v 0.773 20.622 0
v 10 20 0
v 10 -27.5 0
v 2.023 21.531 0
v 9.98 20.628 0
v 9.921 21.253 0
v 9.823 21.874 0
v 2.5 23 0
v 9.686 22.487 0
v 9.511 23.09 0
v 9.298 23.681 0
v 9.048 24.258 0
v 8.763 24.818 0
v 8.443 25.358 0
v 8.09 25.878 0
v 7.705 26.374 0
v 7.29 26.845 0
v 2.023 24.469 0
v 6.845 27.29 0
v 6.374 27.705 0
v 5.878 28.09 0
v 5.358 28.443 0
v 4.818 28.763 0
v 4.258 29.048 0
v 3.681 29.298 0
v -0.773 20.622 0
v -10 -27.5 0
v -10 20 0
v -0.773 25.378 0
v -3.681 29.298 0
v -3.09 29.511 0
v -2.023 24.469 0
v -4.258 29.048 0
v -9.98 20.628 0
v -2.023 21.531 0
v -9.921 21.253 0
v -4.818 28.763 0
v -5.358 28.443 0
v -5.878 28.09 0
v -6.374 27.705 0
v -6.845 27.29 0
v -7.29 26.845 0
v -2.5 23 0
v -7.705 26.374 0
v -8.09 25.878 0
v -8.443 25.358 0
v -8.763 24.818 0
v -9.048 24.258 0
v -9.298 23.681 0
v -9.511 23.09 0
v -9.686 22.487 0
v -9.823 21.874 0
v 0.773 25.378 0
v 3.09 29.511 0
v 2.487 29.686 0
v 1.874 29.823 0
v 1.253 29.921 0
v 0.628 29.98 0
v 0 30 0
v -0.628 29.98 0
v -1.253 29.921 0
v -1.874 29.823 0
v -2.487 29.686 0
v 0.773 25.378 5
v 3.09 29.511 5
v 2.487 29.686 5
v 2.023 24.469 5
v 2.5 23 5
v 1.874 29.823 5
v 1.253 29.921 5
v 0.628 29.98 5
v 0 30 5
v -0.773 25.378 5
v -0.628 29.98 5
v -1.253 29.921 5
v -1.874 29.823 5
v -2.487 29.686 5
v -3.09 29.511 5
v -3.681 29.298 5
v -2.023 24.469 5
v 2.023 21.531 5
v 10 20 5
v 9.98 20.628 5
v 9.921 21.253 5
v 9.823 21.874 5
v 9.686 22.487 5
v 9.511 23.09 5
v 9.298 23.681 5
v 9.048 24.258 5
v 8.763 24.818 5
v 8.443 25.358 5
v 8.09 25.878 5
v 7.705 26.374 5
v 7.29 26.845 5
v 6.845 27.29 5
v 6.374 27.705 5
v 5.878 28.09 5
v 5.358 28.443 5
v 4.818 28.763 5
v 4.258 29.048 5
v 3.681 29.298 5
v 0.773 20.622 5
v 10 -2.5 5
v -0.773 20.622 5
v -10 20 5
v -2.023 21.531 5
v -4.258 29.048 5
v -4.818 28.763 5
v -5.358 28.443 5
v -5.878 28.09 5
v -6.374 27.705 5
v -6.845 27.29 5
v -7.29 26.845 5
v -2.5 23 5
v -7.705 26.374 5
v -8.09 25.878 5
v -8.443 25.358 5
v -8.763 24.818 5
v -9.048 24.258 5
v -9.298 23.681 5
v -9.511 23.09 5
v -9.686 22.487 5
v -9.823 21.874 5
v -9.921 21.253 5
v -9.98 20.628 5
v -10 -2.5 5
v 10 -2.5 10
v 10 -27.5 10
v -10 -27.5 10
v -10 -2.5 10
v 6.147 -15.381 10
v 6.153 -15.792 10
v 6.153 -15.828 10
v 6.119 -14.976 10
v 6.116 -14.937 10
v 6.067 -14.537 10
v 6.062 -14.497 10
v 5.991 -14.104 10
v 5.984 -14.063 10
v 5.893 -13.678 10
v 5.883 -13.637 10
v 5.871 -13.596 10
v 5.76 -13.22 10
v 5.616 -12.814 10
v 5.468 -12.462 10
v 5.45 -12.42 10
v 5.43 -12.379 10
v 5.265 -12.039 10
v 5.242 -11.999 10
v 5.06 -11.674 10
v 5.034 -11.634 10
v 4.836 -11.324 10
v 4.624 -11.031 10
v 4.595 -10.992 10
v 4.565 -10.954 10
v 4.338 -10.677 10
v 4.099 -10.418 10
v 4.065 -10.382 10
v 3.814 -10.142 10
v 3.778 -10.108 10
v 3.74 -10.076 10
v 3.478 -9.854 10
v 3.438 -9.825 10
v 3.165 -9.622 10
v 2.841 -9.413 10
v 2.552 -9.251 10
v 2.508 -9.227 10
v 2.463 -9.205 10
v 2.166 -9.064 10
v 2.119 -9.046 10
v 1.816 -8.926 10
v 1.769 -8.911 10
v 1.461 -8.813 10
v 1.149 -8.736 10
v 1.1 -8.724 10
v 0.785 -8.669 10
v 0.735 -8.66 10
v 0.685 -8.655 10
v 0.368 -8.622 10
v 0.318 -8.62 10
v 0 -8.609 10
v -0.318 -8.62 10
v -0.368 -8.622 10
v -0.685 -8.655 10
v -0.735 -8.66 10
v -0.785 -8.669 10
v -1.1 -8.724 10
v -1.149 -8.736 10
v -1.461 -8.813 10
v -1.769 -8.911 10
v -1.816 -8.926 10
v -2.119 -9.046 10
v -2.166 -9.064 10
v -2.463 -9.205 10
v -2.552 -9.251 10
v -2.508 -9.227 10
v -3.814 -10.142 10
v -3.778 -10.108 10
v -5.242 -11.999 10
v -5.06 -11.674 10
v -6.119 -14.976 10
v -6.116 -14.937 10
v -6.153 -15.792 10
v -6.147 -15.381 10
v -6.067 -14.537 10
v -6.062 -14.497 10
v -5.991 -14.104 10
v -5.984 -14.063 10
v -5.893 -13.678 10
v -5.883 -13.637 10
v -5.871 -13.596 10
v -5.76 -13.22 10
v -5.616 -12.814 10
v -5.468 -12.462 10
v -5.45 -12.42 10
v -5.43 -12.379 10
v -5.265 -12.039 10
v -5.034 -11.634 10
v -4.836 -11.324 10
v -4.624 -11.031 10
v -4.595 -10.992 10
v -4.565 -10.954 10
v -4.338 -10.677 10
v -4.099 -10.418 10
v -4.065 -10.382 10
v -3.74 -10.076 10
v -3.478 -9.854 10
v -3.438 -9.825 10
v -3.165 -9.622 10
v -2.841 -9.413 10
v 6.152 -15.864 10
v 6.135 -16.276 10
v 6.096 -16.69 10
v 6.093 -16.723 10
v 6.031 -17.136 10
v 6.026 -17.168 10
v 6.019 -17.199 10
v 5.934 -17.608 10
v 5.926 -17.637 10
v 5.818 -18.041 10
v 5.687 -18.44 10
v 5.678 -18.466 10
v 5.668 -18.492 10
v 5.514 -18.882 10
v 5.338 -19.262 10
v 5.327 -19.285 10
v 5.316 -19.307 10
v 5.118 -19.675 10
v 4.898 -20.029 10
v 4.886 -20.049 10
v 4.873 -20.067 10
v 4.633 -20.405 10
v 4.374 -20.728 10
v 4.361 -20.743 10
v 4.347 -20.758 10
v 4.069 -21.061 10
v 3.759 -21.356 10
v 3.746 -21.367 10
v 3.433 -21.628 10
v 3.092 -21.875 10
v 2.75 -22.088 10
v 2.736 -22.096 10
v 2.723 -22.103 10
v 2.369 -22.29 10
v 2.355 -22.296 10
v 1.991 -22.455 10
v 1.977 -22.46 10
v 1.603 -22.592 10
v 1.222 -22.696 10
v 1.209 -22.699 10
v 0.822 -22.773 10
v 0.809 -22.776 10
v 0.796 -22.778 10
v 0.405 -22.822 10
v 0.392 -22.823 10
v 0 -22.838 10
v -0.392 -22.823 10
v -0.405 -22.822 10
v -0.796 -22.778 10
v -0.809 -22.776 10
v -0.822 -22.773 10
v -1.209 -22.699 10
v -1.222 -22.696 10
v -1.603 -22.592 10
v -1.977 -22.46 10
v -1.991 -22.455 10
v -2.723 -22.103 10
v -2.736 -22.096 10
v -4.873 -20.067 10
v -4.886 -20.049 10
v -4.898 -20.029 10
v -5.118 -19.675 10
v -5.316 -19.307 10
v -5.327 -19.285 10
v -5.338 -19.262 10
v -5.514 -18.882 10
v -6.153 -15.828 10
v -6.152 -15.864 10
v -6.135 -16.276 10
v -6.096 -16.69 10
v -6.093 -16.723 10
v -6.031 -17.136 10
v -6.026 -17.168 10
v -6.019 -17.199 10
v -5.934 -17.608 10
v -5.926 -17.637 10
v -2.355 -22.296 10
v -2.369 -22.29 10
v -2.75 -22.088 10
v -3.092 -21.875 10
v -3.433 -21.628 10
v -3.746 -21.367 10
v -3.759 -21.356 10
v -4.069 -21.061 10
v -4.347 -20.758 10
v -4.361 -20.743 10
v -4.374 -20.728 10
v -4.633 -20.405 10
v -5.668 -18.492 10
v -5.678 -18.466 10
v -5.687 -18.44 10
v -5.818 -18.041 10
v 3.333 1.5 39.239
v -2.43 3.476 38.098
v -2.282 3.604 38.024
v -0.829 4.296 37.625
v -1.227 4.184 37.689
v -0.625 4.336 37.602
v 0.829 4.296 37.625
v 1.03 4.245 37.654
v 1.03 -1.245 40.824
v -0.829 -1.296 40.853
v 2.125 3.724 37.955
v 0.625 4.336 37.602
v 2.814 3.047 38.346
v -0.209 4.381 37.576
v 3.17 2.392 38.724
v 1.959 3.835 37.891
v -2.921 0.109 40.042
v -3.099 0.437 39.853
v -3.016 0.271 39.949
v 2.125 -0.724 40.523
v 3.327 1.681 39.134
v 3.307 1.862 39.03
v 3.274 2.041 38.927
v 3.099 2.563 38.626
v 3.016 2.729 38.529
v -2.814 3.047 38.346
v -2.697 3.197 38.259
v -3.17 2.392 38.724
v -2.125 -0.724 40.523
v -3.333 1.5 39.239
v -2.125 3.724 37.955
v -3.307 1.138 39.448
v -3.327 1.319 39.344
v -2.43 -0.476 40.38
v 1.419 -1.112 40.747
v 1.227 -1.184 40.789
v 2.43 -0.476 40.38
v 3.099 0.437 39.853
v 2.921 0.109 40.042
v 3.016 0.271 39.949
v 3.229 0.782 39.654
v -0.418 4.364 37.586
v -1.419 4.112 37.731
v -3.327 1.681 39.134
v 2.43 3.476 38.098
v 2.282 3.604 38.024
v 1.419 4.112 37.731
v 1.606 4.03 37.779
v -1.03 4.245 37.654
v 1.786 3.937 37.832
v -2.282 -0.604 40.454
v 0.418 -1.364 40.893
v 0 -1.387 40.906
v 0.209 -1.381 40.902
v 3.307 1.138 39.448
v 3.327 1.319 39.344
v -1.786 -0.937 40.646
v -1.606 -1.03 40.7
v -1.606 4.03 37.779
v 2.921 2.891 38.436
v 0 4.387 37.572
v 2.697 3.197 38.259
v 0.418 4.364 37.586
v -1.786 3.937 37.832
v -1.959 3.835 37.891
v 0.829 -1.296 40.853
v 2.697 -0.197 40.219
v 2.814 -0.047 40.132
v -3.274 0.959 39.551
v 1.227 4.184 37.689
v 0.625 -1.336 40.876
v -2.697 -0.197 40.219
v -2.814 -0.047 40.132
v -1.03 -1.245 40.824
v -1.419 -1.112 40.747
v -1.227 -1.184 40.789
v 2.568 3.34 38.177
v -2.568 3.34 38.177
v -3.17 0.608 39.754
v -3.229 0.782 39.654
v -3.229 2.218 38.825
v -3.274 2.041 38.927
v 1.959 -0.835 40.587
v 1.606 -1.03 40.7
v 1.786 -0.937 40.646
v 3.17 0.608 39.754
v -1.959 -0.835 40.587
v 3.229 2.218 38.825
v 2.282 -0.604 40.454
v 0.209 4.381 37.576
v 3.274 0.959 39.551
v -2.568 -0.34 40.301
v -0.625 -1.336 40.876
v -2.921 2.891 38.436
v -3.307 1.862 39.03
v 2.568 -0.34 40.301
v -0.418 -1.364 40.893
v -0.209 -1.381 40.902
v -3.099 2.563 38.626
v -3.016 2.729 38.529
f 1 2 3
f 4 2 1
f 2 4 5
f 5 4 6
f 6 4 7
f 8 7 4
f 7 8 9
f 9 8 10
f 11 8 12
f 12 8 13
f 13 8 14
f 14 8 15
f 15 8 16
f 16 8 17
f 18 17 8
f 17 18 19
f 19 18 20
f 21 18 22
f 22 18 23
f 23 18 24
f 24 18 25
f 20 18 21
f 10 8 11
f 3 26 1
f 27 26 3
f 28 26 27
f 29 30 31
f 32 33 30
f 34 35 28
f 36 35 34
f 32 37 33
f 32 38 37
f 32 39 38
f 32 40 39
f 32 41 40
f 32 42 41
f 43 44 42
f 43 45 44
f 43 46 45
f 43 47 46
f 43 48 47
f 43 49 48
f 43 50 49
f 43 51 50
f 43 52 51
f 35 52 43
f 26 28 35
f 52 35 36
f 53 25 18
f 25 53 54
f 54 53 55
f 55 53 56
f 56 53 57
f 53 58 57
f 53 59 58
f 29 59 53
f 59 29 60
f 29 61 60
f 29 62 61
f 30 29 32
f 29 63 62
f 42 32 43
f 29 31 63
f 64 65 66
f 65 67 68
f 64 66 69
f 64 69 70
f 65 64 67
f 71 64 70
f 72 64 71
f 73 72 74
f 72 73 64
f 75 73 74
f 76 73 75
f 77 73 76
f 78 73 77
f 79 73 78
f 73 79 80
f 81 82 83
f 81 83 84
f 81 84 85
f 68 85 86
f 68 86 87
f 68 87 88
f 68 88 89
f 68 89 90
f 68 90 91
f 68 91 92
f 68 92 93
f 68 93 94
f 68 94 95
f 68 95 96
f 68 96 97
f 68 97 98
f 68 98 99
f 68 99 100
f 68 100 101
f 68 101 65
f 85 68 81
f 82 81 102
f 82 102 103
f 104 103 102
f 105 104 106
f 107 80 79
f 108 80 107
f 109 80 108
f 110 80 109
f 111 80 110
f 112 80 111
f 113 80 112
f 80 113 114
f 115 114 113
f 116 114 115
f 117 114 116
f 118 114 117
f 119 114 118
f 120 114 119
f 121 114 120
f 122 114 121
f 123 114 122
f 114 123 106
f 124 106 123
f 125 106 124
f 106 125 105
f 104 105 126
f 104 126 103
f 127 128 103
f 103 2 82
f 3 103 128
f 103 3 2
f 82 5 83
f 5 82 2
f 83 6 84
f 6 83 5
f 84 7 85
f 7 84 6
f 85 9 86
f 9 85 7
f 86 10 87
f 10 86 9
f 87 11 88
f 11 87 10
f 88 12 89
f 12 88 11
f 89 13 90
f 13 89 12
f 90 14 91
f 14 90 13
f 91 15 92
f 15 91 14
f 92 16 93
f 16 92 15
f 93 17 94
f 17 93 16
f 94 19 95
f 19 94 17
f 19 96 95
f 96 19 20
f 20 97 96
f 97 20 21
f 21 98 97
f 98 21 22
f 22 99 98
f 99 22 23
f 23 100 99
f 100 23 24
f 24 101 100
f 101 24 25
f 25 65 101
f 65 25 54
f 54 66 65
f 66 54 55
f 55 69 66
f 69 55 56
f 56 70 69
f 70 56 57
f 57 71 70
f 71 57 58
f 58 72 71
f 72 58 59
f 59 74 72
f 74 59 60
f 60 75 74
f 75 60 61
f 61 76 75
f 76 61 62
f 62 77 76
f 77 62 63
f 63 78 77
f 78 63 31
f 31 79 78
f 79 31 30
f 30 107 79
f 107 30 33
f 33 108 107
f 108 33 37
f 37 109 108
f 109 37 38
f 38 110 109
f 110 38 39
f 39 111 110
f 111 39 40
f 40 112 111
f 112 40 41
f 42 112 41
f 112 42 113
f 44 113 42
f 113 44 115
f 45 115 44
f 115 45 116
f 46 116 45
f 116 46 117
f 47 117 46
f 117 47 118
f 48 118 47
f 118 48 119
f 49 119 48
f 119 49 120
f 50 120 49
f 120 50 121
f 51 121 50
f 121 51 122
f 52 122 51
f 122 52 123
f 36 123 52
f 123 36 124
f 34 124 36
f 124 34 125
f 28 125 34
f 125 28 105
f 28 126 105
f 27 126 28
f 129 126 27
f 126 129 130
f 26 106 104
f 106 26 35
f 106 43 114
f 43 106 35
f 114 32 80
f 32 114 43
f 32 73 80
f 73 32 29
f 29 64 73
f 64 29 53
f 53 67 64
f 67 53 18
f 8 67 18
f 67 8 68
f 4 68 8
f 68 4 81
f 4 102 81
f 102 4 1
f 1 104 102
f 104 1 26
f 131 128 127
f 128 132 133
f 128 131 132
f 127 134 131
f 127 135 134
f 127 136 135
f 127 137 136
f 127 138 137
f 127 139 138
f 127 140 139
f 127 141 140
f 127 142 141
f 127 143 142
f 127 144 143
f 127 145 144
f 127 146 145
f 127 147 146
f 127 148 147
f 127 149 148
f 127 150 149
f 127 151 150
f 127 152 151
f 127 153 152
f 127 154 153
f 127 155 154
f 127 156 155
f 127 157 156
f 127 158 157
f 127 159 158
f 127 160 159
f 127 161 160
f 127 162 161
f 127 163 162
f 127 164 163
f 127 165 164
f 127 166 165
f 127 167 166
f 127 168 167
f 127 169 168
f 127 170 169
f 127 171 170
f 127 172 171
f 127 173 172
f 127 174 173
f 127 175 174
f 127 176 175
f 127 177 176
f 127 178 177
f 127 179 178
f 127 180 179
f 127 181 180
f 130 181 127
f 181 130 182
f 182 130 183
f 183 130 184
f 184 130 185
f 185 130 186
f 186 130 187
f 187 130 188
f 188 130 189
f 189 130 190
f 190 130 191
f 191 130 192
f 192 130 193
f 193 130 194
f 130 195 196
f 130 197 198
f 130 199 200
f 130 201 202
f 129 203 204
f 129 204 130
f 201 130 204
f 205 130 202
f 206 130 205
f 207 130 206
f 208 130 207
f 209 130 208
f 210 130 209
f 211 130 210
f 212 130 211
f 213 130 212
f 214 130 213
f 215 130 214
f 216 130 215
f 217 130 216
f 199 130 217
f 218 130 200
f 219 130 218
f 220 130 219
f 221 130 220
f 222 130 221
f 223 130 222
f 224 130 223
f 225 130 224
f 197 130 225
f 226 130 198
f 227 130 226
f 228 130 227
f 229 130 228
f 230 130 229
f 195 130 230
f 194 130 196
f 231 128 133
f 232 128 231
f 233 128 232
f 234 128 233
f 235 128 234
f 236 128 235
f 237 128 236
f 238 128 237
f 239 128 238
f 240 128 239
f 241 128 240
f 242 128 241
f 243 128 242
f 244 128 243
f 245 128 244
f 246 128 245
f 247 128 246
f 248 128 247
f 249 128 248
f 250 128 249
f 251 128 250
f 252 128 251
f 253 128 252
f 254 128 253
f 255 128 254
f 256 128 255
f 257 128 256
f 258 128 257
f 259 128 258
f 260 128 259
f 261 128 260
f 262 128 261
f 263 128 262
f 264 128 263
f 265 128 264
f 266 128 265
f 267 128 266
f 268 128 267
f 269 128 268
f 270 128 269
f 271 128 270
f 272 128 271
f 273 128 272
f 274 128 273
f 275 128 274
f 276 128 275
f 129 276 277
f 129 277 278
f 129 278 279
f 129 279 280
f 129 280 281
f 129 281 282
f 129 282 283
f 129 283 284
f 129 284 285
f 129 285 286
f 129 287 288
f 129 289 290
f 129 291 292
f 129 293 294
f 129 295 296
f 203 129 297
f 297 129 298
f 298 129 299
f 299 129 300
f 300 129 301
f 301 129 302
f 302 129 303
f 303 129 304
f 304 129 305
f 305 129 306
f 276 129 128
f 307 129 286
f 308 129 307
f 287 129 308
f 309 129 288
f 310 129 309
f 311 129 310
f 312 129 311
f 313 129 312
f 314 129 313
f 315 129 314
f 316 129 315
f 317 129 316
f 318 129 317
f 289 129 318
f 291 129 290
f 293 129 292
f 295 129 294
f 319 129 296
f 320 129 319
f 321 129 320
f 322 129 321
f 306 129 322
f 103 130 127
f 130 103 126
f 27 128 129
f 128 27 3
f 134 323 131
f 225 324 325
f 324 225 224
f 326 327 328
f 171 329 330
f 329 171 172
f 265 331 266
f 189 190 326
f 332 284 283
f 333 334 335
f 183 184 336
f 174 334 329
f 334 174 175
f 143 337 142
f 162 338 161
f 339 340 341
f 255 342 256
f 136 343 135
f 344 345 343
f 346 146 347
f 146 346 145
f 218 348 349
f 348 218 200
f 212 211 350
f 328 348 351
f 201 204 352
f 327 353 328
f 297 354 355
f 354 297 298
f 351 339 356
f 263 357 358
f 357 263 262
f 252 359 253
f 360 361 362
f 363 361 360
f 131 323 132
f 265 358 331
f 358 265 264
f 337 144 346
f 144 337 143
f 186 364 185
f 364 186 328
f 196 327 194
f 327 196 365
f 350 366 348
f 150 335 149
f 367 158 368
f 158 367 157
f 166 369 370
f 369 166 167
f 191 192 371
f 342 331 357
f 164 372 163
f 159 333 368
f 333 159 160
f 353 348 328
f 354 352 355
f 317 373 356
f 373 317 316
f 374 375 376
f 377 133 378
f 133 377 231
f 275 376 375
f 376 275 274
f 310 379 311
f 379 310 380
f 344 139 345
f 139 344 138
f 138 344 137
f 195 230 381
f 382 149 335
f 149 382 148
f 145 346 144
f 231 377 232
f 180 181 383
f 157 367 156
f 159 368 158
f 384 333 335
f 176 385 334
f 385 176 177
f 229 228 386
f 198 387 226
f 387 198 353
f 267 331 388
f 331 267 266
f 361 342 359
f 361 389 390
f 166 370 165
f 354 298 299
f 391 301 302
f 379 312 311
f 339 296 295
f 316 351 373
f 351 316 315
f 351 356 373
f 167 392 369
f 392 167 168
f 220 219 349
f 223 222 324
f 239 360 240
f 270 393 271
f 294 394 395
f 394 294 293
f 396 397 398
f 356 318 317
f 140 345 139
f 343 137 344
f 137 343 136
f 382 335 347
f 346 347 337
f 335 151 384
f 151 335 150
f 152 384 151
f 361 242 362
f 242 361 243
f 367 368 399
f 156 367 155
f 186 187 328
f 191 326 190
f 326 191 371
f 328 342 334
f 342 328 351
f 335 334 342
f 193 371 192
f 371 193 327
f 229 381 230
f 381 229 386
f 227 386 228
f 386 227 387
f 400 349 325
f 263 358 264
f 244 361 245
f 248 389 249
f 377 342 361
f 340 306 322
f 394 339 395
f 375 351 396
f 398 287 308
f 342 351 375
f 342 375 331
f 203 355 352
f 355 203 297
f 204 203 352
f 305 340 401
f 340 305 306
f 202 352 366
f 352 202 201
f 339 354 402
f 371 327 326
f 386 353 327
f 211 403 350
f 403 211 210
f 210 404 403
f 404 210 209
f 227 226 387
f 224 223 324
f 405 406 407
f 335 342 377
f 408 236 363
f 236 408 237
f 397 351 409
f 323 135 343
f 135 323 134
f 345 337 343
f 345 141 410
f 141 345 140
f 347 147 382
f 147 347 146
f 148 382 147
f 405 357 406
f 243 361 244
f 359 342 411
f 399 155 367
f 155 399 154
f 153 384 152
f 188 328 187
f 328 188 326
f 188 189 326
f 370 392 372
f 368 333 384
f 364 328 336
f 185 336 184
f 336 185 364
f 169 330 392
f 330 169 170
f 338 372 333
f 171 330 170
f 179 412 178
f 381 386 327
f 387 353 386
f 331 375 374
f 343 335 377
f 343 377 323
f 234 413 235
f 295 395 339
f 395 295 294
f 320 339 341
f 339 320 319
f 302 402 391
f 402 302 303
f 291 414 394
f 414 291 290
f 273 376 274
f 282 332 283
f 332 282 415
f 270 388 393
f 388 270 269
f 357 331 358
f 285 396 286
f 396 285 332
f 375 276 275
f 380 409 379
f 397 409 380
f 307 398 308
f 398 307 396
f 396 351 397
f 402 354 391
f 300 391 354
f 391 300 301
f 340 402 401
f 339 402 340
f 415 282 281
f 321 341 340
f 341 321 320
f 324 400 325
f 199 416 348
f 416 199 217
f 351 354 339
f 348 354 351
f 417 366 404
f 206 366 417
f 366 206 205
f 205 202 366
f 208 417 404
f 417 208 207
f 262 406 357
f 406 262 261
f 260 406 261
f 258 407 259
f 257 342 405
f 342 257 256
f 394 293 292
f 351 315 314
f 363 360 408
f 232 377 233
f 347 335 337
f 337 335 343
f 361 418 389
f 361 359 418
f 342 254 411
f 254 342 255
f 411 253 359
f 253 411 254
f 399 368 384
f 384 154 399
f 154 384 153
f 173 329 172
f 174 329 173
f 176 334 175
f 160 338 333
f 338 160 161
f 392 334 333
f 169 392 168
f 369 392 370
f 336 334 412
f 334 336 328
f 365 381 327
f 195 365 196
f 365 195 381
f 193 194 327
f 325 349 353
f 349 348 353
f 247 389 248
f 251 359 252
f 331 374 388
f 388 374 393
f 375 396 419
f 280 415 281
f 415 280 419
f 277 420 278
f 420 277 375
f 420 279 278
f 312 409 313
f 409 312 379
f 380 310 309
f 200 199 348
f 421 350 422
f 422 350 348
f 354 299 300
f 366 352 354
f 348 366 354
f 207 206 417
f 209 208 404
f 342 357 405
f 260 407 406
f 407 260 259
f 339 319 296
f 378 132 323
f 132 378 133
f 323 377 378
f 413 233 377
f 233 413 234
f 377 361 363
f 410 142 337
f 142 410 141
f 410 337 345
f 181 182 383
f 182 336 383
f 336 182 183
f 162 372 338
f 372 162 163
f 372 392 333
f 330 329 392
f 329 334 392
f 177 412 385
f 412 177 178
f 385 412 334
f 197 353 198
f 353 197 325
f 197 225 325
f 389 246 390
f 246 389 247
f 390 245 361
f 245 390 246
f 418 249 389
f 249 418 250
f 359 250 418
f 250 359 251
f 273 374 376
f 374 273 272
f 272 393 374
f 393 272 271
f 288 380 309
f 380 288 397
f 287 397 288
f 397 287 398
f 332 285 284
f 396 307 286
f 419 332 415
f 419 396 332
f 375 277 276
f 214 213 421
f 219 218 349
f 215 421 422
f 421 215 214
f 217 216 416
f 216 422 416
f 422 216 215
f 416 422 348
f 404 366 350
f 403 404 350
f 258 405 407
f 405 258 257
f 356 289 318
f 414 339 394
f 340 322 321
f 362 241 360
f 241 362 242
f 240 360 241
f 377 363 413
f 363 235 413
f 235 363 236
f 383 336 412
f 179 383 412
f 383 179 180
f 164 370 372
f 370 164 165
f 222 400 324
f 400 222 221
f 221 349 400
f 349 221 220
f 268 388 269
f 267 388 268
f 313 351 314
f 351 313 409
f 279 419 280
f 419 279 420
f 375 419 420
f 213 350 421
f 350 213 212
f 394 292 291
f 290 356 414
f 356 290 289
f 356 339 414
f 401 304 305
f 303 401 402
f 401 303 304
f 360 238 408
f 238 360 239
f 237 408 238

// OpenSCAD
width= 20;
nail = 5;
height= 5;
hook= 40;
$fn = 100;

union() {
    linear_extrude(height){
        //top part
        translate([0, width, 0]) {
            difference() {
                circle(d=width);
                    translate([0,3,0]) circle(d=nail, $fn=10);
            }
        }
        //base
        square([width, width*2], center=true);
    }   
    //bottom part
    linear_extrude(height*2) {
        translate([0, -width+5, 0]) square([width, width+5], center=true);
    }
        
    // hook       
    translate([0, -width, 2]){
        rotate(a=-30, v=[1,0,0]) {
           translate([0,0,3]) cylinder(h=hook, r1=width/3, r2=width/6);
        }

    }
}
